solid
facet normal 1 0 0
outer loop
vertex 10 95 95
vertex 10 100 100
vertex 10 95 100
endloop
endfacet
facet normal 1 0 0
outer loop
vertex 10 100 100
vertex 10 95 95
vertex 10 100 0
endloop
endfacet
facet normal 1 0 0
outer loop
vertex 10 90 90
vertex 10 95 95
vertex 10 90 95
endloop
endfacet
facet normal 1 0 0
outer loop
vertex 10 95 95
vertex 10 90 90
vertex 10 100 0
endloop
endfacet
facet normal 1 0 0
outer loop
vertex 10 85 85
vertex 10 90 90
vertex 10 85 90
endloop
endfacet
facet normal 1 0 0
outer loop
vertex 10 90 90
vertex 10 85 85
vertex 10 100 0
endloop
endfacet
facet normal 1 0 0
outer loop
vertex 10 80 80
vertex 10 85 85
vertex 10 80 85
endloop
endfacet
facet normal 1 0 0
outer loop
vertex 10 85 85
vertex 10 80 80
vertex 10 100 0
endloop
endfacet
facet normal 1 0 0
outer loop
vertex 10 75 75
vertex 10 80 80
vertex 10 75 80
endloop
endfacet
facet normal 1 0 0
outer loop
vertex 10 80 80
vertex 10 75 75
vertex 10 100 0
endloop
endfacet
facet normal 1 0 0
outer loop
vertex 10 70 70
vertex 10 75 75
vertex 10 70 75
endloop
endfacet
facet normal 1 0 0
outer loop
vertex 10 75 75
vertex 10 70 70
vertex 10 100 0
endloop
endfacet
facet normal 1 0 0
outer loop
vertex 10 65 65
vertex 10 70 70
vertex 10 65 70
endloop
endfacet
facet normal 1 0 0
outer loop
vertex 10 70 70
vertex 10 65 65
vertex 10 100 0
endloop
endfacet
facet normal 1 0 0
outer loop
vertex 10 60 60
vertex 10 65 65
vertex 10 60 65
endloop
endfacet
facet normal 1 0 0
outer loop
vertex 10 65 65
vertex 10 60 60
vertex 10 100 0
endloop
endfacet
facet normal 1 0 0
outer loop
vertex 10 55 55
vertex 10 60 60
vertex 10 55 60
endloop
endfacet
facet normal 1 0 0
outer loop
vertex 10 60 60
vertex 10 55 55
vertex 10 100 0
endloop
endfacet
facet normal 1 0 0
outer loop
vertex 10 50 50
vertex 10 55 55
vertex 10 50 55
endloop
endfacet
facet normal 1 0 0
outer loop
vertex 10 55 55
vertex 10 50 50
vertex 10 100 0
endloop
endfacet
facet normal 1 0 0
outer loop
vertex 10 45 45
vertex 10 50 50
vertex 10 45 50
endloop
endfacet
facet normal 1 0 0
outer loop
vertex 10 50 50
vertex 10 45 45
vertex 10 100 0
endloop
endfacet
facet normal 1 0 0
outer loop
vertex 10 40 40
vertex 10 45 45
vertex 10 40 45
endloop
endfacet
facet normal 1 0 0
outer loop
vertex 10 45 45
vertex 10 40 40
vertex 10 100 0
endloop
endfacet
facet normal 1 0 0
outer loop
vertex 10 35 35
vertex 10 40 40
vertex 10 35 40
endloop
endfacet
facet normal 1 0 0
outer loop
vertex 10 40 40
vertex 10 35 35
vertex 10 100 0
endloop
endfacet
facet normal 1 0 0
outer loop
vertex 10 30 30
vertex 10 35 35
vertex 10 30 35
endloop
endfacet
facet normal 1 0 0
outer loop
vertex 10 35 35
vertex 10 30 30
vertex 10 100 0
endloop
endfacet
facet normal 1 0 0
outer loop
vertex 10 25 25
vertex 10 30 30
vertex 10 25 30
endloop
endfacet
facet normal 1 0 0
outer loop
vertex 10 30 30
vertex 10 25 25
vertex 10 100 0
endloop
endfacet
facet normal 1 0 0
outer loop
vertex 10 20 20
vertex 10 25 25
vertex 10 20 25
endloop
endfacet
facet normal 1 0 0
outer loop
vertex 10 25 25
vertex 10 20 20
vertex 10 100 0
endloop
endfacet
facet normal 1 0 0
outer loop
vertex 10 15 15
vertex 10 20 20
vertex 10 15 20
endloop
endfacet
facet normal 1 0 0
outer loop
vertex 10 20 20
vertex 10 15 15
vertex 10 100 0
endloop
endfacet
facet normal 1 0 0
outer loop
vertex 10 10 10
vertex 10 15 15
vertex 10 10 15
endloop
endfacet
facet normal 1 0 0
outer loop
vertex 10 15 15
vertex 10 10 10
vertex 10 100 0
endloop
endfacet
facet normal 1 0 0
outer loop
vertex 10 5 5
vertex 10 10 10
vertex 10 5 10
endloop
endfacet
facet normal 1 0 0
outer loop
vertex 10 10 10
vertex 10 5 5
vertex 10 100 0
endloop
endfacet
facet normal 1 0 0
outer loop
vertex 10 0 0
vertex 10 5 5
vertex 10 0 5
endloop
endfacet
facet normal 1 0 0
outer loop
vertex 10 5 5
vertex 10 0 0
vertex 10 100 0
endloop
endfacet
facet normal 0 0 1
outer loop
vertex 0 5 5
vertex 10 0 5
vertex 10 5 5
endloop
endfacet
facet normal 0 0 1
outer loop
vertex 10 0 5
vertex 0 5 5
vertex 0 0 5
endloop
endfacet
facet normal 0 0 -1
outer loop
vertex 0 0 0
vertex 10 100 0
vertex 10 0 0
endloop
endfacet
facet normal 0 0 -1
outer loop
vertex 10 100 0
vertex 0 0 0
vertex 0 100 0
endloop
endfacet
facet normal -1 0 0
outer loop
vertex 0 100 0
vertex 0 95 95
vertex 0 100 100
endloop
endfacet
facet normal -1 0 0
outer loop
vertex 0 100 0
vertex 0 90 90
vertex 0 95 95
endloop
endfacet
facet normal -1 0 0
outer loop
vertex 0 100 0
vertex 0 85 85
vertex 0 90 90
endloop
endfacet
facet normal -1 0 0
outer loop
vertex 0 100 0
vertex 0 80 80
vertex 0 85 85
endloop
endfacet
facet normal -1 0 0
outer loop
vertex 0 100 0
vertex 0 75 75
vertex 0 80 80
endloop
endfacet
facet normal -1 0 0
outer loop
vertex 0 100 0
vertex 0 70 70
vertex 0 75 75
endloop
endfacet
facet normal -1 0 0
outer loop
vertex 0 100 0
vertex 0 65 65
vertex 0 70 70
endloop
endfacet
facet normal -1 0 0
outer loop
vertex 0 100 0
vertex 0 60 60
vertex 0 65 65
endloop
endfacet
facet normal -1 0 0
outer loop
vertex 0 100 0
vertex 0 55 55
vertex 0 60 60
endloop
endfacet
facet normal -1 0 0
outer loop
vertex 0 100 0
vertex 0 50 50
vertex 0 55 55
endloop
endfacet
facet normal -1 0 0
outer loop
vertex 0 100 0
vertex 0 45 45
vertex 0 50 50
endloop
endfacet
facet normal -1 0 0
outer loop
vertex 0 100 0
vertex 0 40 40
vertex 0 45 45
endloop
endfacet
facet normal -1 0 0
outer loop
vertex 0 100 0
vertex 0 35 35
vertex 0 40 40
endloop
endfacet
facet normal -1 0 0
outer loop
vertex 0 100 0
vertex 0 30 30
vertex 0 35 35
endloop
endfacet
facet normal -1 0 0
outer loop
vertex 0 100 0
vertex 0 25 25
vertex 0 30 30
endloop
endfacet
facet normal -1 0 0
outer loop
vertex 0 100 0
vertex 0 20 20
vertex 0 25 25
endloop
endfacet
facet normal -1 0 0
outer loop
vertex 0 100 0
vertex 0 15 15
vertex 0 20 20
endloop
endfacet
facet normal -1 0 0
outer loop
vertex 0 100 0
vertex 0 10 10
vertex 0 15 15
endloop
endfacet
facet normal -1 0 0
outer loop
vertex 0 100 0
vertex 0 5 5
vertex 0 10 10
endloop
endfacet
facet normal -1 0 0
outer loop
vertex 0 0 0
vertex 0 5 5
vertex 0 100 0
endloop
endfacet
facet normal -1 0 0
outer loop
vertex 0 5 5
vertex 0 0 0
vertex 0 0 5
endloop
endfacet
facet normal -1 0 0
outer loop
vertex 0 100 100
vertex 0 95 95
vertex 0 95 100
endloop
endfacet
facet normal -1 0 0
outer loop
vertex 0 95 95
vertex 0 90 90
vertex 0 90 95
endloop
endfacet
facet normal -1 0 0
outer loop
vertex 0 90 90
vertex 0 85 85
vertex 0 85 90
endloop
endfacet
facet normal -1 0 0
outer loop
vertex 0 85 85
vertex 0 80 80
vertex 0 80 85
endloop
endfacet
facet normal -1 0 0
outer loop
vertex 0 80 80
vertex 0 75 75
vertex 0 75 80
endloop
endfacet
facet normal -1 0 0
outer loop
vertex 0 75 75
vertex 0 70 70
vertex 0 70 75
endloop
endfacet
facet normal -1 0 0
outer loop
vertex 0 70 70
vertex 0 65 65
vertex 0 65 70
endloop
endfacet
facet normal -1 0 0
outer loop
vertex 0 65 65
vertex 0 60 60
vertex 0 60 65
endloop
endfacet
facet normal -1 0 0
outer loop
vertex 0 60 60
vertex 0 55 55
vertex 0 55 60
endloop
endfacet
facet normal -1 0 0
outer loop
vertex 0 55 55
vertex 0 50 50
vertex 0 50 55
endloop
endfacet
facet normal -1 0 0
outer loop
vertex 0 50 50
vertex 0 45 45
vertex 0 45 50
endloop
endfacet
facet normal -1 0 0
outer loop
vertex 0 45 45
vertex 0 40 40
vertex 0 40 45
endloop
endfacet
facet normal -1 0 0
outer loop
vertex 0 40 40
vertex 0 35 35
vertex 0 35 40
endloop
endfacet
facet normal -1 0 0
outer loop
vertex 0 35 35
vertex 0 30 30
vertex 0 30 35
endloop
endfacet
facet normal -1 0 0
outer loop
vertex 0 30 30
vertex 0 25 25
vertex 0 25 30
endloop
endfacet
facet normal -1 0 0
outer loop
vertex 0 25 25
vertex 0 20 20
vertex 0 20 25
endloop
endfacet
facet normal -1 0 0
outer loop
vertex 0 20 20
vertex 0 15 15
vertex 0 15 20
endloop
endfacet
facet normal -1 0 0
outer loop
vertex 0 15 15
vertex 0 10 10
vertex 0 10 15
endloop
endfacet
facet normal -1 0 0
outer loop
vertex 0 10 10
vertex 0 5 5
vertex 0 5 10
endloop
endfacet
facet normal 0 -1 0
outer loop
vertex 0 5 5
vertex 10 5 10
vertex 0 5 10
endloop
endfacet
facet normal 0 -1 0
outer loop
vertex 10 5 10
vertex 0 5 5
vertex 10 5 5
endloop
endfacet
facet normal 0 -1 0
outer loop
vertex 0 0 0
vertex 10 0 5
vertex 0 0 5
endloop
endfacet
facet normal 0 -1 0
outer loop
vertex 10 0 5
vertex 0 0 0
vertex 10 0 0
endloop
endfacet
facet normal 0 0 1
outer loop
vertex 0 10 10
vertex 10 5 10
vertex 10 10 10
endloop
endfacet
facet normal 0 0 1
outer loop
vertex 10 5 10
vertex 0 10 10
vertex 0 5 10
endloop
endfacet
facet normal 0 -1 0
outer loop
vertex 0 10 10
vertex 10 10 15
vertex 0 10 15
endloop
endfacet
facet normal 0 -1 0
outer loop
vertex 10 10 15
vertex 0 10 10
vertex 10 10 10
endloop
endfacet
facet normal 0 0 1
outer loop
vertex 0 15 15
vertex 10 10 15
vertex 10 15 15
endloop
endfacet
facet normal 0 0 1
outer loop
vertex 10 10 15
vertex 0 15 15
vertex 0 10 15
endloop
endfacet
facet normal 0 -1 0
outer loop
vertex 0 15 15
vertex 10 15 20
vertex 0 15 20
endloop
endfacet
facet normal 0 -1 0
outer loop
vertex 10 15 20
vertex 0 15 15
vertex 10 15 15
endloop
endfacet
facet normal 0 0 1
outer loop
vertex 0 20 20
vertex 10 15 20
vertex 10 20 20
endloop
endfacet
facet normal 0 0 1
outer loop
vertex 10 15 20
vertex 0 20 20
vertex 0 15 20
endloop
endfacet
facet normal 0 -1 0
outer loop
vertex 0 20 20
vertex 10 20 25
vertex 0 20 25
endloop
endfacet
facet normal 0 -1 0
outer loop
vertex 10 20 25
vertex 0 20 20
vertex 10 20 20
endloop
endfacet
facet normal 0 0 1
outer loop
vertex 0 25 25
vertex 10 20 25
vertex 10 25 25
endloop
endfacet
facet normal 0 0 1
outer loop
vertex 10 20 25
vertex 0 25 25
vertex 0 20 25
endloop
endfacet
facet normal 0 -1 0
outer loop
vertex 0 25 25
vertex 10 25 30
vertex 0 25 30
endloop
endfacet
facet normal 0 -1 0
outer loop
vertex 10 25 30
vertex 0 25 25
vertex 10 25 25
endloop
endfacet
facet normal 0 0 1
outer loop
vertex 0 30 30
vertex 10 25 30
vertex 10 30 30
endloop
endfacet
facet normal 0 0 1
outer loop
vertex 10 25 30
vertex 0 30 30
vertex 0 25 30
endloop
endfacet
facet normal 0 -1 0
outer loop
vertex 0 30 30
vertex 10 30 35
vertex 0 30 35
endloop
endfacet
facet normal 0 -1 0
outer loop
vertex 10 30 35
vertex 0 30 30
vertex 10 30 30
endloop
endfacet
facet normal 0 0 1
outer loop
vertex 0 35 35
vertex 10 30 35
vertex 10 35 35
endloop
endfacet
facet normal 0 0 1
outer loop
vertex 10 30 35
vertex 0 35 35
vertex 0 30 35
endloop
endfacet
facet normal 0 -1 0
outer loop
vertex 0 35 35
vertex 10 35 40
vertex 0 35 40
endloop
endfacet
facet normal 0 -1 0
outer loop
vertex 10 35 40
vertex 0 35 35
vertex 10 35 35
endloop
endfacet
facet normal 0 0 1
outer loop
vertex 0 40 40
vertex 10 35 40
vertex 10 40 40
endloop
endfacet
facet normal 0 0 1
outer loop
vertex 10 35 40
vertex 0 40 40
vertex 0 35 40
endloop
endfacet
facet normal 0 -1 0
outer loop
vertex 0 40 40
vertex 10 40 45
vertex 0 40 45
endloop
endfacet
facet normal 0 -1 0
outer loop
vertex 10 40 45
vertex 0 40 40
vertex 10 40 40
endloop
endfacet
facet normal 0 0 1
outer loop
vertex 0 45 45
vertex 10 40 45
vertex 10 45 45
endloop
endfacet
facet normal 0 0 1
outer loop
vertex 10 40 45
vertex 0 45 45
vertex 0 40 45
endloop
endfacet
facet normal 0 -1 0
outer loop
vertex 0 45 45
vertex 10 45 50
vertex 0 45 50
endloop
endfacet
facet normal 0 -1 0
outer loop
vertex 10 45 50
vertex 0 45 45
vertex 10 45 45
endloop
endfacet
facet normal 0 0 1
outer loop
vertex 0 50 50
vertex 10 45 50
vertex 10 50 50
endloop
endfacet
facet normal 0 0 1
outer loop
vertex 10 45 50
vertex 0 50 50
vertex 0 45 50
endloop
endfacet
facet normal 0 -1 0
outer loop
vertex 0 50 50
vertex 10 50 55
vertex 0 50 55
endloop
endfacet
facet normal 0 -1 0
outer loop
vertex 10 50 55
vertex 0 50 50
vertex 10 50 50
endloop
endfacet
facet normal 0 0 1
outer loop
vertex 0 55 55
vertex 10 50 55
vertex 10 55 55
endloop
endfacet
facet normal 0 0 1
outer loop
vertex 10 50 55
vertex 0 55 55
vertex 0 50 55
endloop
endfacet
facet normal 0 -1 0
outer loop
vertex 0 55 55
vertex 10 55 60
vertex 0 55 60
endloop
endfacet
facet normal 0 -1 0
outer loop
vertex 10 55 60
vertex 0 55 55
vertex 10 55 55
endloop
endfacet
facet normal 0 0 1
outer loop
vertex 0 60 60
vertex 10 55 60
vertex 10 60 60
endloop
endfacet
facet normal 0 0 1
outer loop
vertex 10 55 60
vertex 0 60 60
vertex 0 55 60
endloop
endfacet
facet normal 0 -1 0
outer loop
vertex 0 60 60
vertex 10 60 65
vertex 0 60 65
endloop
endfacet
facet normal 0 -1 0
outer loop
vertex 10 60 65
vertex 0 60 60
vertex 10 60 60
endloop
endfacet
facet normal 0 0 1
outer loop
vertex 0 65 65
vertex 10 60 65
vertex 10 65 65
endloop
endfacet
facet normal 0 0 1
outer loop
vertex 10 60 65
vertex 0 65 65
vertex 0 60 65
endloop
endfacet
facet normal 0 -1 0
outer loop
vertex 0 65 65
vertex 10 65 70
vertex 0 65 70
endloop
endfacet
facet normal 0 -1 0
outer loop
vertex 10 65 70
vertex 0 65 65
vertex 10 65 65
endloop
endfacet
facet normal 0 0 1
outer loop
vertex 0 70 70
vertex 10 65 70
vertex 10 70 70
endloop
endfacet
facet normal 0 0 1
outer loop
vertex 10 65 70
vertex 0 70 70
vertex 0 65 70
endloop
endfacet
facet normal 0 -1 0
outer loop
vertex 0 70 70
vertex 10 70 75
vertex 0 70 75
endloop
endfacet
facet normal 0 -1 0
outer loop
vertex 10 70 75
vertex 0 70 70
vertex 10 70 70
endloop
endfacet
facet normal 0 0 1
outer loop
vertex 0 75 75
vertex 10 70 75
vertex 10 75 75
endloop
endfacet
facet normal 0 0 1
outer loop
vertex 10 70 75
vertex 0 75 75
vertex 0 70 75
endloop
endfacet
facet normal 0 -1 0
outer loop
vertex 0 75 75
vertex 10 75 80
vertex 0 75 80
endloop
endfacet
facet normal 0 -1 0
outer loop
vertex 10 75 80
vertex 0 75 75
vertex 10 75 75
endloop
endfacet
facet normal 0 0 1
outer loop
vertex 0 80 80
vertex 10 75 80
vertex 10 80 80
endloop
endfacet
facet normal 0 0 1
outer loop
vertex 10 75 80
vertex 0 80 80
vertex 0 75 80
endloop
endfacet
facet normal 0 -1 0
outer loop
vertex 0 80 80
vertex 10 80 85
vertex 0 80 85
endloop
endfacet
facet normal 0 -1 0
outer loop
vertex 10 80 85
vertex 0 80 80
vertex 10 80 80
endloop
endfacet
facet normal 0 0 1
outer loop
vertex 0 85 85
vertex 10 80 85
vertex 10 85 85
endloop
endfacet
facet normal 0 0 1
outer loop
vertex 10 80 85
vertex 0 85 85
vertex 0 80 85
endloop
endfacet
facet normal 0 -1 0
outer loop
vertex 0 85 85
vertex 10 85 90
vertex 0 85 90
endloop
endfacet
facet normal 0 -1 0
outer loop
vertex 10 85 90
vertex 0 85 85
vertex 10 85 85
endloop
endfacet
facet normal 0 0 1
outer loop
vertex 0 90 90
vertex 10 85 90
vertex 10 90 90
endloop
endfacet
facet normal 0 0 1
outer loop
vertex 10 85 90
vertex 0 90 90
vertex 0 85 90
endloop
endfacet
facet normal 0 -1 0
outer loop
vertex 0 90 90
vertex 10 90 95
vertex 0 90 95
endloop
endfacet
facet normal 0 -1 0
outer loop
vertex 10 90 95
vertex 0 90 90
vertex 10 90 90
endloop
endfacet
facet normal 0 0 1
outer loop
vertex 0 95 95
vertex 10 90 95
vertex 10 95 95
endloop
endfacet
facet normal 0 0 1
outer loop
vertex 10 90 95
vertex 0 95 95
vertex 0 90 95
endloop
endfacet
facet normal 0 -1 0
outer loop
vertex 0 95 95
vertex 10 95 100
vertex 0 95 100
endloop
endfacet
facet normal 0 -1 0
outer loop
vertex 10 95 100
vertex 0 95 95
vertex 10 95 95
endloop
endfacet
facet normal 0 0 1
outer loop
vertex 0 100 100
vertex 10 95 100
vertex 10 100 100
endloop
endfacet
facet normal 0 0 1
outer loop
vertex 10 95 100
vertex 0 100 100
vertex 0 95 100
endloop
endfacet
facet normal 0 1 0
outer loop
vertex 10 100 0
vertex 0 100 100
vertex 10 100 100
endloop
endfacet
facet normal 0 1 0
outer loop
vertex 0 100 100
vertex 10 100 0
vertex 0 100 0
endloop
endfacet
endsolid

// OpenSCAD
stepsize=5;

stairs(20);

module stairs(noOfSteps)
{
    for(i=[1:noOfSteps])
        translate([0,stepsize*(i-1),0]) cube([stepsize*2,stepsize,stepsize*i]);
}
